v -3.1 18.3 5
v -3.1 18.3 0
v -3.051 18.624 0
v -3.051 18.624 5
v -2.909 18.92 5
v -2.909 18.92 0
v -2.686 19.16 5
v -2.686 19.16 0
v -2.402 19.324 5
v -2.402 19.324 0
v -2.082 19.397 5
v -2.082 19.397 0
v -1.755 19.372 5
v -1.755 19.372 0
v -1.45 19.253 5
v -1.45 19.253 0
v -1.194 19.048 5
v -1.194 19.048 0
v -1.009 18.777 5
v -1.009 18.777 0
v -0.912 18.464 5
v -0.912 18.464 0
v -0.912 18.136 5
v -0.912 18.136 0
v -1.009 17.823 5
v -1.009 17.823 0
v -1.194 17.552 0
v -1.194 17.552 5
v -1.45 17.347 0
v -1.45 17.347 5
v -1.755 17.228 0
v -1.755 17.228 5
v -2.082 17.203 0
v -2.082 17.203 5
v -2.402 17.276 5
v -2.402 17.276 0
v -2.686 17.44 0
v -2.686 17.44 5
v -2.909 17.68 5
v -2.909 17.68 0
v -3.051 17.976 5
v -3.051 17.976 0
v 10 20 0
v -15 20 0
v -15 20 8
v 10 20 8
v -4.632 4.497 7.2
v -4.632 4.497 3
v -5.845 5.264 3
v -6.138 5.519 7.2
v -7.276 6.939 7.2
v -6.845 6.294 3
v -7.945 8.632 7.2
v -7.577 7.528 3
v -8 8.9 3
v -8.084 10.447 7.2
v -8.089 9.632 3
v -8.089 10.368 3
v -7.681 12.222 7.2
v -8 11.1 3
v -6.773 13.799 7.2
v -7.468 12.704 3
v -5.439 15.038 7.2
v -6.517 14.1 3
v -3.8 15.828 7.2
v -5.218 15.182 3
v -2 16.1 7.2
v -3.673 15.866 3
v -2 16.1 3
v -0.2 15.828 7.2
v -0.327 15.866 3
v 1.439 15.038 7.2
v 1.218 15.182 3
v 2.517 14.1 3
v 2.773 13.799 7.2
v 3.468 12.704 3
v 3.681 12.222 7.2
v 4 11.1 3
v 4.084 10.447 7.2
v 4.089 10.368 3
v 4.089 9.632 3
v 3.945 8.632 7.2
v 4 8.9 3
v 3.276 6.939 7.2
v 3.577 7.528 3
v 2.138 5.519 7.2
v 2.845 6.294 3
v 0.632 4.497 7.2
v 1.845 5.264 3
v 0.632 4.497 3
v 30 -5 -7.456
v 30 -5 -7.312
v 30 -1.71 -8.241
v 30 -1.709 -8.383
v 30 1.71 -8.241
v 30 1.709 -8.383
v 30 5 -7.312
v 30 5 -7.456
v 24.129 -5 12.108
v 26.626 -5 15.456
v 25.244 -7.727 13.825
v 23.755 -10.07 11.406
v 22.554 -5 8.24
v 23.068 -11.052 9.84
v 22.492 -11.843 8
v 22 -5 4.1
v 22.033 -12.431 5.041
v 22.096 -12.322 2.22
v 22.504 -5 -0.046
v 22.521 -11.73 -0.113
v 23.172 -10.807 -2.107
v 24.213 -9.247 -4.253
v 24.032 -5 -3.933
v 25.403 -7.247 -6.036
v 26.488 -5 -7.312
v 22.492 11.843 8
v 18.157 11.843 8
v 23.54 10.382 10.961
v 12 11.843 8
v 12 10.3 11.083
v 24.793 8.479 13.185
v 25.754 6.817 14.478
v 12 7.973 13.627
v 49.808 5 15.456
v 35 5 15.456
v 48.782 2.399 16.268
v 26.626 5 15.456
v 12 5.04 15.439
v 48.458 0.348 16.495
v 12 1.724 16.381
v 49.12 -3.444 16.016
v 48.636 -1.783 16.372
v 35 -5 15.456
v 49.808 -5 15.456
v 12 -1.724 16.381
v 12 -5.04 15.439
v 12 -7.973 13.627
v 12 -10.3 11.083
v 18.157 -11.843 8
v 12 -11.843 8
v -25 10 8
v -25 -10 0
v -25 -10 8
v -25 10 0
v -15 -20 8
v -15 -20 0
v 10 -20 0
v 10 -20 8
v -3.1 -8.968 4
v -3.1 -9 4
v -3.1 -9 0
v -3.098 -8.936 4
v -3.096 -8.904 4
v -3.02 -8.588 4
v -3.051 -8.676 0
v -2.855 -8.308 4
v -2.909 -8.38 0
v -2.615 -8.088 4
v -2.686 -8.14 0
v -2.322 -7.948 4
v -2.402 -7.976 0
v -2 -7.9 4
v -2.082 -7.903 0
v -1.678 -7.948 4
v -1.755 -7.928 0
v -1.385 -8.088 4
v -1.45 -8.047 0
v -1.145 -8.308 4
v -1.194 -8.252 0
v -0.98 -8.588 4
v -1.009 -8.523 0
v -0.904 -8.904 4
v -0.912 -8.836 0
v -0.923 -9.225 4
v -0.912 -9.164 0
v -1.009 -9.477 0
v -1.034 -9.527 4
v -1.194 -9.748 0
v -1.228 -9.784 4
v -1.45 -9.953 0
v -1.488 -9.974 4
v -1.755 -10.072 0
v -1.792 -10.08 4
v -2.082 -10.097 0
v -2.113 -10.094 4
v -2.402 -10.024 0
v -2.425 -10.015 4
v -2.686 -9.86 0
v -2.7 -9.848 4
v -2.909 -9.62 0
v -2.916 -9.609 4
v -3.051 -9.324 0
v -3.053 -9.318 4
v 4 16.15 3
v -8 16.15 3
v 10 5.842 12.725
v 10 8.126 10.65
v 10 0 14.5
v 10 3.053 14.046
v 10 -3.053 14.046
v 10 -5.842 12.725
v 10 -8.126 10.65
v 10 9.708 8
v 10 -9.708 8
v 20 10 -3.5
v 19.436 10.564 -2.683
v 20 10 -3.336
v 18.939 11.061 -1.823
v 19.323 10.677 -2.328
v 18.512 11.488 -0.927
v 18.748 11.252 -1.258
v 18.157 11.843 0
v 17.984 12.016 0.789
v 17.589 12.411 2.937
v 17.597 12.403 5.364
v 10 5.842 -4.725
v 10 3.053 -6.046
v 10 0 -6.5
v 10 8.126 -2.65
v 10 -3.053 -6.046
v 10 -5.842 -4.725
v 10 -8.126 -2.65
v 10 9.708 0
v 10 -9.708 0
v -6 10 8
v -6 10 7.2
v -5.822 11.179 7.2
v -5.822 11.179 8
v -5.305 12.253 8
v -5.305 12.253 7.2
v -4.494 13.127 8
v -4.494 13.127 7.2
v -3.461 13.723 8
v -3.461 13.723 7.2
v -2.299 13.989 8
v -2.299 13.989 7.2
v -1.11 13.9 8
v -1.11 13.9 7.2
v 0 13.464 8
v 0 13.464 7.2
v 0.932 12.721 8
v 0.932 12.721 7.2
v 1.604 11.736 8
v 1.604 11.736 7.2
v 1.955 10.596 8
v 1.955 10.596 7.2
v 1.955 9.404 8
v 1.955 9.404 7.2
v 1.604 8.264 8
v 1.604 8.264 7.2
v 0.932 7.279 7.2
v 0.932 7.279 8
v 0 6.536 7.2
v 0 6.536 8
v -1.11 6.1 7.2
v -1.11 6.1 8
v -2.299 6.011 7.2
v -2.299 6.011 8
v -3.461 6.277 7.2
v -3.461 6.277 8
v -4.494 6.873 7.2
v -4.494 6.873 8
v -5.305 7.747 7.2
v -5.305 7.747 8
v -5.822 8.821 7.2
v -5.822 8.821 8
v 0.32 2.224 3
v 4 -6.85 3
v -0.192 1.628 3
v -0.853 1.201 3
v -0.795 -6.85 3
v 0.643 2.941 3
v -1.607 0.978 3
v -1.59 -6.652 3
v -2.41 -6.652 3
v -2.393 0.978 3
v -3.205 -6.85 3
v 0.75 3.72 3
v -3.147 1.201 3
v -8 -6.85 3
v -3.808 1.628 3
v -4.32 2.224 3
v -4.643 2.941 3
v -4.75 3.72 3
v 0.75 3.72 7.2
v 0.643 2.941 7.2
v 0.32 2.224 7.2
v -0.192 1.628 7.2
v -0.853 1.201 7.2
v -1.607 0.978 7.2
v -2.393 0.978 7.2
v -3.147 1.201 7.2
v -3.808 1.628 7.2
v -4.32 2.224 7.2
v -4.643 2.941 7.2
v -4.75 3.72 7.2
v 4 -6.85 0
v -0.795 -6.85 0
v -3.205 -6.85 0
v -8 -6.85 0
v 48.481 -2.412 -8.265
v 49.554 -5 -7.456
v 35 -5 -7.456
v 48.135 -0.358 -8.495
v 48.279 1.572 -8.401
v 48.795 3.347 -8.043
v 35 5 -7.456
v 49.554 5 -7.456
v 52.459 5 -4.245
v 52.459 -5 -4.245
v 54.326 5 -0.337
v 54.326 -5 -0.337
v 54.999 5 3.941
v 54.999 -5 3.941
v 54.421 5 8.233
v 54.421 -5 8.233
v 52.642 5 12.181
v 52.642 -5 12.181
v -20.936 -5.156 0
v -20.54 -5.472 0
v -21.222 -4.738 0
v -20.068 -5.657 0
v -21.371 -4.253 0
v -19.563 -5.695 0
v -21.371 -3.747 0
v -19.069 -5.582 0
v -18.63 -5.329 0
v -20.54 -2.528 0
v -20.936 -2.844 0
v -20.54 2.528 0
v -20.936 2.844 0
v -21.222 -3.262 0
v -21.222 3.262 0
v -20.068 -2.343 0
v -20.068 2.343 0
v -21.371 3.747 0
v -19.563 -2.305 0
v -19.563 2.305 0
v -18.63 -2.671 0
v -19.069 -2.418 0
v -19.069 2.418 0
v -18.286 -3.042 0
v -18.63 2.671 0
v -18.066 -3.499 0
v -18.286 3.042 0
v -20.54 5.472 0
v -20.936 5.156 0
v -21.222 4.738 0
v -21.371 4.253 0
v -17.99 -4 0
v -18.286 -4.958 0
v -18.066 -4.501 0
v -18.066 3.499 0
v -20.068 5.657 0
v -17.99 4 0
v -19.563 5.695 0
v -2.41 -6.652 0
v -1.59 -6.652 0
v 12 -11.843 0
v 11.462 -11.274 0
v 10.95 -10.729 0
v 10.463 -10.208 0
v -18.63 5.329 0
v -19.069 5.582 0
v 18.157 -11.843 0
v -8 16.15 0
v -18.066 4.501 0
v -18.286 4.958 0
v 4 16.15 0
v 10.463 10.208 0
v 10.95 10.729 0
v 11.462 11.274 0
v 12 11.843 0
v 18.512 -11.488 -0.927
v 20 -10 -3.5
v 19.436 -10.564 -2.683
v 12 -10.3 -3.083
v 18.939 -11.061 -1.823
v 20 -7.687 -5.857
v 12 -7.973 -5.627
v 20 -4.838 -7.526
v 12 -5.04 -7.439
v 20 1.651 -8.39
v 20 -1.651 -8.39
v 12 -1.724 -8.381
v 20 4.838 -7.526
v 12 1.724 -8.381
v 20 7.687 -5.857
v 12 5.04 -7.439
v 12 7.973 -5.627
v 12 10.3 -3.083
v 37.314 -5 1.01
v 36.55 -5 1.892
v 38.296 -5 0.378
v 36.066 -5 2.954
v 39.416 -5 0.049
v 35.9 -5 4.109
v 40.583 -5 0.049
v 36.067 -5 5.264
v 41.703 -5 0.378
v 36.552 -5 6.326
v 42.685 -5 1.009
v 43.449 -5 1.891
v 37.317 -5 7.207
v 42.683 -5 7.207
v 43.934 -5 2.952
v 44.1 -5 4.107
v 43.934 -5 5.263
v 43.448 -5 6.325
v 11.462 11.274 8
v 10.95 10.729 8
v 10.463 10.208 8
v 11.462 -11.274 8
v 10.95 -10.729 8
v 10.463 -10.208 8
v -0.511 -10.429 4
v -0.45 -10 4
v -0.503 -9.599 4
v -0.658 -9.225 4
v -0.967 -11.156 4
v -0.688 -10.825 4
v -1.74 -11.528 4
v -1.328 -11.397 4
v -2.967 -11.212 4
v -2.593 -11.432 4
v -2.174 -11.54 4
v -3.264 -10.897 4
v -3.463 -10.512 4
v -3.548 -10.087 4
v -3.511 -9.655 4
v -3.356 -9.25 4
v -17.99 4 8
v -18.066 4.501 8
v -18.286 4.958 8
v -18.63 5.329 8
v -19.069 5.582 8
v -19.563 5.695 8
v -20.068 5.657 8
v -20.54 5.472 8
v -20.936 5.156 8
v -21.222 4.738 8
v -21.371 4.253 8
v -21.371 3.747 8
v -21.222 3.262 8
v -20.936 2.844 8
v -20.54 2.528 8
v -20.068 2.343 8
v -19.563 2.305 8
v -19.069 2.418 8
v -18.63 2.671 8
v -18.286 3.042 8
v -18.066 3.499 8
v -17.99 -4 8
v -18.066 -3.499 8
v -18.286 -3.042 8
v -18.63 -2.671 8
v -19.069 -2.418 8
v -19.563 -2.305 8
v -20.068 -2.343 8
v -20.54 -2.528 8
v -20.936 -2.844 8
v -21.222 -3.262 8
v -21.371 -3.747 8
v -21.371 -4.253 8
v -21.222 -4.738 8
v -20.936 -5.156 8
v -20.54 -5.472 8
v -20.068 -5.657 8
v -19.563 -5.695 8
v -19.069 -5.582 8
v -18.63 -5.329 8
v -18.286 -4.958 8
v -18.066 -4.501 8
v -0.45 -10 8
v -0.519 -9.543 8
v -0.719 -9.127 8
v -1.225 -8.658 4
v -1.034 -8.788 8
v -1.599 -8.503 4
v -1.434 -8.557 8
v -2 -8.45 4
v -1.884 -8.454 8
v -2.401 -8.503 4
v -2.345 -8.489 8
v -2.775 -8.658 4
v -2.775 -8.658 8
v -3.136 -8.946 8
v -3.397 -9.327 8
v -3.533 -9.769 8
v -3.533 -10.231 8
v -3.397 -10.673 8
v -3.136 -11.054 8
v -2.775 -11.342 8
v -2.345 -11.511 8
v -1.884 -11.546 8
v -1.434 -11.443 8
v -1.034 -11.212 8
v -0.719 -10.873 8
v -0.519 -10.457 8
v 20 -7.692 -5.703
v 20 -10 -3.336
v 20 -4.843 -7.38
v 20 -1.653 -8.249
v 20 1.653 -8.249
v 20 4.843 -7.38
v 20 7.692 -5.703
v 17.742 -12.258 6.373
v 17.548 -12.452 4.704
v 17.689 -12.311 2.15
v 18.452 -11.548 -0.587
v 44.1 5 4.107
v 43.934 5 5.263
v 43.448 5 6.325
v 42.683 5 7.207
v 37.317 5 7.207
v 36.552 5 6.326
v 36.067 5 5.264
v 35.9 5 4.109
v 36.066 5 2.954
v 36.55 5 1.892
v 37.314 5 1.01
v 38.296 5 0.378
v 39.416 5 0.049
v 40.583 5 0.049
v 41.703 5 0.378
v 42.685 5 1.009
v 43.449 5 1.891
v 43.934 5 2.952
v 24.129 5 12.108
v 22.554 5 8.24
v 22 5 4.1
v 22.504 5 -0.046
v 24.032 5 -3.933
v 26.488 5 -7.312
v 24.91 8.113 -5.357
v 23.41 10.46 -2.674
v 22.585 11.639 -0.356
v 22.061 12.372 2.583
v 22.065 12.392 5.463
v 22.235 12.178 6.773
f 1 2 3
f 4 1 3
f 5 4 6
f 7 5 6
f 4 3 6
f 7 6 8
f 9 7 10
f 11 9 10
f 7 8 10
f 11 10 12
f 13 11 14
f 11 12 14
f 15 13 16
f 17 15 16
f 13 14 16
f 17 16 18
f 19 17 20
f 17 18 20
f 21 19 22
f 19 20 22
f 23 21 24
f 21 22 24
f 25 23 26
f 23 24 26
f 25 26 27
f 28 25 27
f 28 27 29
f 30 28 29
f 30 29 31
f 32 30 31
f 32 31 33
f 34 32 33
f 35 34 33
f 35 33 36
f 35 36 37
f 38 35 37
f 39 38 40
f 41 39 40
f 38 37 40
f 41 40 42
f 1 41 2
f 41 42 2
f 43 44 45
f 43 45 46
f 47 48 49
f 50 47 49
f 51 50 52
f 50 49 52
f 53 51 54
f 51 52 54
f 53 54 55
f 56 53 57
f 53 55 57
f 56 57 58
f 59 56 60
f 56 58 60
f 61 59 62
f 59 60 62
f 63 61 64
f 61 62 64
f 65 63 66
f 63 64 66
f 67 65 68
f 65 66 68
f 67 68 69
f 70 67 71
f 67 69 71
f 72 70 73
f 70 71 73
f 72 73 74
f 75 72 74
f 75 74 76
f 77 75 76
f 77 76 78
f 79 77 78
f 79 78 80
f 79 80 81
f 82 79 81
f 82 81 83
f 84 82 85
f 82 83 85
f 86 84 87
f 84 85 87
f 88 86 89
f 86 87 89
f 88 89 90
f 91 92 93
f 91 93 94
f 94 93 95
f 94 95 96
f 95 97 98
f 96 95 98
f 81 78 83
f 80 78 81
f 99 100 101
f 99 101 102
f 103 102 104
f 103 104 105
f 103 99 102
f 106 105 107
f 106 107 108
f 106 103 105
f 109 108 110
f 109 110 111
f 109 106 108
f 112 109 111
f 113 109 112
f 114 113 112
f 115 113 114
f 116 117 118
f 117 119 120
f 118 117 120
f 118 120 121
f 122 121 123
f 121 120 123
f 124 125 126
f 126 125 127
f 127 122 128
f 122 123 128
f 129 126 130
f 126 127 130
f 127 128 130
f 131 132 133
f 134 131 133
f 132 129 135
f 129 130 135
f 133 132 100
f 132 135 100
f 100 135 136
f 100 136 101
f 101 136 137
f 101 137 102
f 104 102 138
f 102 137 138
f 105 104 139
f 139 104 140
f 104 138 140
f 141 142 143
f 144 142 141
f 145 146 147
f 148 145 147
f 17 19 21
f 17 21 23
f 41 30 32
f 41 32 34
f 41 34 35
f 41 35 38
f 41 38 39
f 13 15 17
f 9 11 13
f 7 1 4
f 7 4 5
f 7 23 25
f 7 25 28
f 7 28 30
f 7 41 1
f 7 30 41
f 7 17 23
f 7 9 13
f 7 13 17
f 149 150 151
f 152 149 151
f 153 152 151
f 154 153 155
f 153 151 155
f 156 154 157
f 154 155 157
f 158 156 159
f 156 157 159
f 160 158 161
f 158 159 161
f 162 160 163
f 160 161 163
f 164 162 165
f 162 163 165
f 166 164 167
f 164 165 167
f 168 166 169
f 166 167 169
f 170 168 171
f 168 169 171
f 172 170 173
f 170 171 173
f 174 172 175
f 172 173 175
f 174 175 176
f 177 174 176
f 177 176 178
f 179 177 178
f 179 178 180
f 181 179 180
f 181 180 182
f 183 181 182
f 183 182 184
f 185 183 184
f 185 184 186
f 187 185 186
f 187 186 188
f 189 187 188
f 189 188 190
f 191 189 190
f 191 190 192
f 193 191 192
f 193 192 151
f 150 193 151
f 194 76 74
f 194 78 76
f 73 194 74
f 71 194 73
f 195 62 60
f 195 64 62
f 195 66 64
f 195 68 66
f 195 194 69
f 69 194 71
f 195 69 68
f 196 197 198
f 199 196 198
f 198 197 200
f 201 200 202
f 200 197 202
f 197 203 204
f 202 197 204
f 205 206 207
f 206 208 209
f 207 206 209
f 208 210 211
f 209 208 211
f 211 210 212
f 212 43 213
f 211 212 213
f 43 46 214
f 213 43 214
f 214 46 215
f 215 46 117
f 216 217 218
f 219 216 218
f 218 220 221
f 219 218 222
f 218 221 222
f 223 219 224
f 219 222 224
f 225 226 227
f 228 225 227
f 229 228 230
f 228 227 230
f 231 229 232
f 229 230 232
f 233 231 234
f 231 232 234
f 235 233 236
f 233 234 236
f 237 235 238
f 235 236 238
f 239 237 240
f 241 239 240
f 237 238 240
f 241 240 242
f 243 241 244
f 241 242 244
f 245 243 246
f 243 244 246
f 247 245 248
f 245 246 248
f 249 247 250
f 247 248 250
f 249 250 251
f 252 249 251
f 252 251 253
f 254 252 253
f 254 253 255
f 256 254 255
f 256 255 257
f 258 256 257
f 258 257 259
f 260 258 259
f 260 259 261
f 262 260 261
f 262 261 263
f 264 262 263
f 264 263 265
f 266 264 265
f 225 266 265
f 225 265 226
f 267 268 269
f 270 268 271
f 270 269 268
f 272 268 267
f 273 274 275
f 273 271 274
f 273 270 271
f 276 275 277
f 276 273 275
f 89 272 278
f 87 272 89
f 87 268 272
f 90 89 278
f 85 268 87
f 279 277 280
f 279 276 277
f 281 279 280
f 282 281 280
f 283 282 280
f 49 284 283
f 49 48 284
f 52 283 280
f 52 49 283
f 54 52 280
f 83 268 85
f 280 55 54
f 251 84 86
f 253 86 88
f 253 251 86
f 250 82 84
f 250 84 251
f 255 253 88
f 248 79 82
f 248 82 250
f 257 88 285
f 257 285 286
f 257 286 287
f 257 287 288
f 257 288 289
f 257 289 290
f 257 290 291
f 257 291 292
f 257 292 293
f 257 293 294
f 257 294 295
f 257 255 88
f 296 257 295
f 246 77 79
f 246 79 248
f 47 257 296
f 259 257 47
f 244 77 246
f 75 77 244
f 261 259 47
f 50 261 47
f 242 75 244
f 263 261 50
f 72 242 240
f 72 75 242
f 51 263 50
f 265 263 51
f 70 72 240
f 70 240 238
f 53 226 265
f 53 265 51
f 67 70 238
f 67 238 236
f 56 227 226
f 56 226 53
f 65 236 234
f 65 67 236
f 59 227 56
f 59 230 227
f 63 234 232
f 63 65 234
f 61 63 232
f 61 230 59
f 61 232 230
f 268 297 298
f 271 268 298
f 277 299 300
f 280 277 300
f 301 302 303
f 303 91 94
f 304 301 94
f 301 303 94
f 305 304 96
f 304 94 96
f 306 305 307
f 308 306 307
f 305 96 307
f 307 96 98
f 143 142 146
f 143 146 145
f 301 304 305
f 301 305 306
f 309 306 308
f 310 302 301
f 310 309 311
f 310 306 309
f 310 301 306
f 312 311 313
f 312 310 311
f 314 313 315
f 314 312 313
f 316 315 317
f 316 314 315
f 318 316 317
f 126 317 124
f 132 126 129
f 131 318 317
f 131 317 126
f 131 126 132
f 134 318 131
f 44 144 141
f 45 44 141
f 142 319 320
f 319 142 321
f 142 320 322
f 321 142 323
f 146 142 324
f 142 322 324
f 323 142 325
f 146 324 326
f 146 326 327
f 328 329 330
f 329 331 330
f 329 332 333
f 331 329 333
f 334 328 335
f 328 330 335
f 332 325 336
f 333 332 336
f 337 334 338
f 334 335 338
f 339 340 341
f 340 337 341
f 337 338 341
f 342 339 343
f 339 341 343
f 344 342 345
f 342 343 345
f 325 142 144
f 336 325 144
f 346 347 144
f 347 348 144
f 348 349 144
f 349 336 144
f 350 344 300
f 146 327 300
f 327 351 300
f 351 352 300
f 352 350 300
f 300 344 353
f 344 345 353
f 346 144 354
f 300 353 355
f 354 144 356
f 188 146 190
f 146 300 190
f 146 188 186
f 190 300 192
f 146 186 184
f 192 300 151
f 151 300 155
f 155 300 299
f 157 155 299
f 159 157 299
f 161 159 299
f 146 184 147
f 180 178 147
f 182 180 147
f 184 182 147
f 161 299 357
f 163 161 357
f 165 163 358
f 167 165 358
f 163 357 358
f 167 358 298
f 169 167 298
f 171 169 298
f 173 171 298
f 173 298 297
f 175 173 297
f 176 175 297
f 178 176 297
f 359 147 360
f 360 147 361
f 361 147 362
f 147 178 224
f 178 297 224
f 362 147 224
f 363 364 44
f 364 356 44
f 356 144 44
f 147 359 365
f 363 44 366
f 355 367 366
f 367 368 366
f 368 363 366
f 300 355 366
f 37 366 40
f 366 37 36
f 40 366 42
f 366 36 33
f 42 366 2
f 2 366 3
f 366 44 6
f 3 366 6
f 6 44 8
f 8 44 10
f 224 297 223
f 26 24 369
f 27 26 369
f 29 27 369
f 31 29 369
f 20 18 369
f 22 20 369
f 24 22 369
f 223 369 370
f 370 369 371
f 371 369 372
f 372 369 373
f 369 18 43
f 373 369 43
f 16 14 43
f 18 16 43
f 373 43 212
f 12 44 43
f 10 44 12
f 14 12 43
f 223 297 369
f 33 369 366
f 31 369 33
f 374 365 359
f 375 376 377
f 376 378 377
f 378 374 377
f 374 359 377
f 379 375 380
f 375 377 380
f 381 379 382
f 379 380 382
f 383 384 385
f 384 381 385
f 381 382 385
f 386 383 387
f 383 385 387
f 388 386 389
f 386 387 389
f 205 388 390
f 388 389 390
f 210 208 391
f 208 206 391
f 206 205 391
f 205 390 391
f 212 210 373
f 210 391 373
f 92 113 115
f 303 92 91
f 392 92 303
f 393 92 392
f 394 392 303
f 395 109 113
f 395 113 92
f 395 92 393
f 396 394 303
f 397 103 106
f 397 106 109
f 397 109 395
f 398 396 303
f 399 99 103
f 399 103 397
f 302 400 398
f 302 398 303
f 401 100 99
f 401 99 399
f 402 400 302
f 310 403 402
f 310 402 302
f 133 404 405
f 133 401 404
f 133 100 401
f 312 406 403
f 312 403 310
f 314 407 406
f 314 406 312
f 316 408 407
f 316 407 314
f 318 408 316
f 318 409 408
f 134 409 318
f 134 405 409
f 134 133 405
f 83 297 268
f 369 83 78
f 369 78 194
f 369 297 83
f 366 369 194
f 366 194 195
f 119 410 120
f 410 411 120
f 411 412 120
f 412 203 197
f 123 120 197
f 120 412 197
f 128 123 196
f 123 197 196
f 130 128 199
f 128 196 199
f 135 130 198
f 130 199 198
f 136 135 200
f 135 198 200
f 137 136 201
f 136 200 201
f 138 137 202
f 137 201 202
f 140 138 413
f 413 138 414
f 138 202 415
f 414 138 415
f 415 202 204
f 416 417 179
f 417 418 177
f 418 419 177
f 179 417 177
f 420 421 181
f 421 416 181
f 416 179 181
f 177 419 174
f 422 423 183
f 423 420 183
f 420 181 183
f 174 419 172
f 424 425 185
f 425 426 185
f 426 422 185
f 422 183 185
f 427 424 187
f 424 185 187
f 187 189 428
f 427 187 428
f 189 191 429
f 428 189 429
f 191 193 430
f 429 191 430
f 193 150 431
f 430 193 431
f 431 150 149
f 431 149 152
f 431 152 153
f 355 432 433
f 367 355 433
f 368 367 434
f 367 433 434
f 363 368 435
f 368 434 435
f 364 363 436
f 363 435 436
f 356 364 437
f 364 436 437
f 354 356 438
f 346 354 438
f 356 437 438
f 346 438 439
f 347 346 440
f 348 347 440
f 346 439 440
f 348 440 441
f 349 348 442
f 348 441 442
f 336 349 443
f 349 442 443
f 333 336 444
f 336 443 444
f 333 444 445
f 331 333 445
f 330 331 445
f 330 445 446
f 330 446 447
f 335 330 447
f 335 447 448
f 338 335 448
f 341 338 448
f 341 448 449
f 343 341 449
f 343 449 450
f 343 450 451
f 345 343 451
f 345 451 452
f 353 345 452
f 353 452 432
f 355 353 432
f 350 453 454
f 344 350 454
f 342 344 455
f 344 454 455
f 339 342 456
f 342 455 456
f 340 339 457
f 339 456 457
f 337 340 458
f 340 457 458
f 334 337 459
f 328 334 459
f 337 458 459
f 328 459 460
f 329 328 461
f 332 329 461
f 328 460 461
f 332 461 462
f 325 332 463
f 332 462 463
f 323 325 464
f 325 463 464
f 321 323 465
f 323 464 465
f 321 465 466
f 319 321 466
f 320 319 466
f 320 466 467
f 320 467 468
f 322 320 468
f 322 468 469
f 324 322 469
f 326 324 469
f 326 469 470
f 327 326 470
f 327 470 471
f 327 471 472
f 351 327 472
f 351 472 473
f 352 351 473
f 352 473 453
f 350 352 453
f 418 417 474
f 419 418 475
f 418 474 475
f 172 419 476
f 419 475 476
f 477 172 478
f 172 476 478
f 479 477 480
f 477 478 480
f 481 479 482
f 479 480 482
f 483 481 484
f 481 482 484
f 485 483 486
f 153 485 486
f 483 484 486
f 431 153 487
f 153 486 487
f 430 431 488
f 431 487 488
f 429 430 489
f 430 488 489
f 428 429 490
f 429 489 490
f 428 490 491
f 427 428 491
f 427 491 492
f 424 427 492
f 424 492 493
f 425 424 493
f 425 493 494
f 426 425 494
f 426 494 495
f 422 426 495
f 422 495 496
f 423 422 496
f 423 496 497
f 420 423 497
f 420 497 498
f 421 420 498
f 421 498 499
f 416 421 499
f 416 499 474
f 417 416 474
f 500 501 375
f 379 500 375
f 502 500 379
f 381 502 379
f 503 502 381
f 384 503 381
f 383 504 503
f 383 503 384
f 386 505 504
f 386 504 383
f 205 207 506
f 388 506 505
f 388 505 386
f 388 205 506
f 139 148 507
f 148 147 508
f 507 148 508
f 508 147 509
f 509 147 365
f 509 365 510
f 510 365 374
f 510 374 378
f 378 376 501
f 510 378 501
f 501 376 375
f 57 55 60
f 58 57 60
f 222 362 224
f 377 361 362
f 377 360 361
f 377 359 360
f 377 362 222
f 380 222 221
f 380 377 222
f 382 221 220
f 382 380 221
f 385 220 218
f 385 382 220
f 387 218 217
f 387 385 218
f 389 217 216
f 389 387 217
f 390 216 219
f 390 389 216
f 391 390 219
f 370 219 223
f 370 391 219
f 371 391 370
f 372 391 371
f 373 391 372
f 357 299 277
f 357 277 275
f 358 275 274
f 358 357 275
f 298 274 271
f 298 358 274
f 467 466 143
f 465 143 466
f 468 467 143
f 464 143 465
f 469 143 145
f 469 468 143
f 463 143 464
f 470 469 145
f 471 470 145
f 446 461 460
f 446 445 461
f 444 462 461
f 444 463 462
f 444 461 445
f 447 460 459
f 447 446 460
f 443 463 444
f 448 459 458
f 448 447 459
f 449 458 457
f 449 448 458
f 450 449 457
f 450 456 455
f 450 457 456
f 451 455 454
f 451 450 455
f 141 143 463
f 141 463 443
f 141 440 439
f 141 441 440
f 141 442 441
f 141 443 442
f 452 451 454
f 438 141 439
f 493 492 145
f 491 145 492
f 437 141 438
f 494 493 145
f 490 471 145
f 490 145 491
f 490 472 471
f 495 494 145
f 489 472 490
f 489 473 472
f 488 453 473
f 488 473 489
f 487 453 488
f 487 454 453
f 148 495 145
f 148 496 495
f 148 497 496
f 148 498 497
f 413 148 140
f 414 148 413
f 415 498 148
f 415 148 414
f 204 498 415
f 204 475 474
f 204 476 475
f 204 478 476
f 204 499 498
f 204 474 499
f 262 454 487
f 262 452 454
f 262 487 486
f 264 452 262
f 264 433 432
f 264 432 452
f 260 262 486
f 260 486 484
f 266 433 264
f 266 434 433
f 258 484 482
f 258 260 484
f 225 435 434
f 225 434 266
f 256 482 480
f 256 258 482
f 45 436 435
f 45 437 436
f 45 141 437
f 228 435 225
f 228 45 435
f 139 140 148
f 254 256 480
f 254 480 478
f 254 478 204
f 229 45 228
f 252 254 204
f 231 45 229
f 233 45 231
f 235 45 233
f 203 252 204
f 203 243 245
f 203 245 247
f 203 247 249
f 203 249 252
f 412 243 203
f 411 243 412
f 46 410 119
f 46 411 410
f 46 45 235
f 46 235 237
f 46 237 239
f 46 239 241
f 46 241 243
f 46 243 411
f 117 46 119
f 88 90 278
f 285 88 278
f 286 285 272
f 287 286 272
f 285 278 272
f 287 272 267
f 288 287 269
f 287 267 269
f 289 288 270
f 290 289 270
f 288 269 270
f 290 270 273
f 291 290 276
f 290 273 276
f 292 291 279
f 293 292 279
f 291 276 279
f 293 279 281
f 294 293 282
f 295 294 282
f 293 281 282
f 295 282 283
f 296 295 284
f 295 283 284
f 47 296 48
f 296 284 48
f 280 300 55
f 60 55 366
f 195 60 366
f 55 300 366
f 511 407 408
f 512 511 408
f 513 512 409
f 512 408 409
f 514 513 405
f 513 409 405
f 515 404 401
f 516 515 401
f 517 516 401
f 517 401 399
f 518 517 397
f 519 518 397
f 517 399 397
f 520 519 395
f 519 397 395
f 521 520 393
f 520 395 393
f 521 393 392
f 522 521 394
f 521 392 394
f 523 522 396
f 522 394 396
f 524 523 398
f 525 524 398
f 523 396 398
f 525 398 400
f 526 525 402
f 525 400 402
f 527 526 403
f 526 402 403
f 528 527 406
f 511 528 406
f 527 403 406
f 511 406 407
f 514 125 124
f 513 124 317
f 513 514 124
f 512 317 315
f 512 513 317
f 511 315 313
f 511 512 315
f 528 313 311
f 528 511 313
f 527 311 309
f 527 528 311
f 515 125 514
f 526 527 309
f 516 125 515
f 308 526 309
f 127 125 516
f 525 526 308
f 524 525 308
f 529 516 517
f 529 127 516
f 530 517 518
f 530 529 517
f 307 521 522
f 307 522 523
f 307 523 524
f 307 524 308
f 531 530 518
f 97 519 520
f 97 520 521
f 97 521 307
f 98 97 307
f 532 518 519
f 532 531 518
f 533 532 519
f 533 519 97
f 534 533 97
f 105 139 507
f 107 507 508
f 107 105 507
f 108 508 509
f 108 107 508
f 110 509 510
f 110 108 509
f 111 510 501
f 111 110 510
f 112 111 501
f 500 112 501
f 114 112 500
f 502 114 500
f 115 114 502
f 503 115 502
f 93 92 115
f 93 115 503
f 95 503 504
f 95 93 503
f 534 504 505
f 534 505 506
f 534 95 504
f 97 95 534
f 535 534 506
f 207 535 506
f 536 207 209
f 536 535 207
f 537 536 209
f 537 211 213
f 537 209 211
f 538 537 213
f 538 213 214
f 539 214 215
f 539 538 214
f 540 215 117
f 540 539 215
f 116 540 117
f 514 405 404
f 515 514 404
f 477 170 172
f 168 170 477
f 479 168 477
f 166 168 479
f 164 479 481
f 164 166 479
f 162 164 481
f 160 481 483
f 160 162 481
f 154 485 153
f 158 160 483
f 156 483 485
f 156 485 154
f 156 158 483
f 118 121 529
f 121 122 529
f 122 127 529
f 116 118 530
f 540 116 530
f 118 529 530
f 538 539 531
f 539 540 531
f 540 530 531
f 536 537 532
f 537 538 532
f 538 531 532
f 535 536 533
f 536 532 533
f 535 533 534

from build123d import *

# Parameters (mm, degrees)
SKETCH_1_W           = 50
SKETCH_1_H           = 40
EXTRUDE_1_DEPTH      = 8
CHAMFER_1_SIZE       = 10
SKETCH_2_R           = 1.55
CUT_EXTRUDE_1_DEPTH  = 10
EXTRUDE_2_DEPTH      = 30
EXTRUDE_2_DEPTH_BACK = 15
SKETCH_3_R           = 12.5
SKETCH_4_R           = 1.7
CUT_EXTRUDE_2_DEPTH  = 15
CUT_EXTRUDE_START    = -20
CUT_EXTRUDE_3_DEPTH  = 20
SKETCH_7_R           = 16.5
CUT_EXTRUDE_8_DEPTH  = 33
CUT_EXTRUDE_9_DEPTH  = 20
CHAMFER_3_SIZE       = 2
CUT_EXTRUDE_START_2  = 20
SKETCH_10_OUTSIDE_W  = 45.574
SKETCH_10_OUTSIDE_H  = 60.574
SKETCH_10_OUTSIDE_R  = 12.466047995
CUT_EXTRUDE_10_DEPTH = 10
CHAMFER_4_SIZE       = 10
SKETCH_14_W          = 12
SKETCH_14_H          = 23
CUT_EXTRUDE_11_DEPTH = 3
CUT_EXTRUDE_12_DEPTH = 4.2
SKETCH_16_R          = 1.1
CUT_EXTRUDE_13_DEPTH = 5
SKETCH_17_R          = 3.372674955
EXTRUDE_3_DEPTH      = 4
SKETCH_18_R          = 1.1
CUT_EXTRUDE_14_DEPTH = 4
SKETCH_20_R          = 4
CUT_EXTRUDE_15_DEPTH = 4
CUT_EXTRUDE_17_DEPTH = 10


# Read off the part's stored shape, not the designer's step: 切除-拉伸3
with BuildPart() as part:
    # 草图1 → 凸台-拉伸1 (new body)
    with BuildSketch(Plane.XY):
        Rectangle(SKETCH_1_W, SKETCH_1_H)
    extrude(amount=EXTRUDE_1_DEPTH)

    # 倒角1
    chamfer_1_edges = [part.edges().sort_by_distance(p)[0] for p in [
        (-25, -20, 4),
        (-25, 20, 4),
    ]]
    chamfer(chamfer_1_edges, length=CHAMFER_1_SIZE)

    # 草图2 → 切除-拉伸1 (cut)
    with BuildSketch(Plane.XY.offset(8)):
        with Locations((-2, -10)):
            Circle(SKETCH_2_R)
        with Locations((-2, 10)):
            Circle(SKETCH_2_R)
    extrude(amount=-CUT_EXTRUDE_1_DEPTH, mode=Mode.SUBTRACT)

    # 草图3 → 凸台-拉伸2 (add, two sides: drawn at the far end of the back side and taken through both)
    with BuildSketch(Plane(origin=(25, 0, 0), x_dir=(0, 0, -1), z_dir=(1, 0, 0)).offset(-EXTRUDE_2_DEPTH_BACK)):
        with Locations(Location((-4, 0, 0), (0, 0, 251.337075115))):
            Circle(SKETCH_3_R)
    extrude(amount=EXTRUDE_2_DEPTH + EXTRUDE_2_DEPTH_BACK)

    # 草图4 → 切除-拉伸2 (cut)
    with BuildSketch(Plane.XY.offset(8)):
        with Locations((-19.690178066, -4)):
            Circle(SKETCH_4_R)
        with Locations((-19.690178066, 4)):
            Circle(SKETCH_4_R)
    extrude(amount=-CUT_EXTRUDE_2_DEPTH, mode=Mode.SUBTRACT)

    # 切除-拉伸3 outline → 切除-拉伸3 (cut)
    with BuildSketch(Plane(origin=(55, 0, 0), x_dir=(0, 0, -1), z_dir=(1, 0, 0)).offset(CUT_EXTRUDE_START)):
        with BuildLine():
            Line((7.456439237, -5), (-15.456439237, -5))
            ThreePointArc((-15.456439237, -5), (-4, -12.5), (7.456439237, -5))
        make_face()
        with BuildLine():
            ThreePointArc((7.456439237, 5), (-4, 12.5), (-15.456439237, 5))
            Line((-15.456439237, 5), (7.456439237, 5))
        make_face()
    extrude(amount=CUT_EXTRUDE_3_DEPTH, mode=Mode.SUBTRACT)

    # 草图7 → 切除-拉伸8 (cut)
    with BuildSketch(Plane.XZ.offset(5)):
        with Locations((38.5, 4)):
            Circle(SKETCH_7_R)
    cut_extrude_8 = extrude(amount=CUT_EXTRUDE_8_DEPTH, mode=Mode.SUBTRACT)

    # 镜向1: 切除-拉伸8 across plane
    add(cut_extrude_8.mirror(Plane.ZX), mode=Mode.SUBTRACT)

    # 草图8 → 切除-拉伸9 (cut)
    with BuildSketch(Plane.XZ.offset(5)):
        with BuildLine():
            Line((40, 19.107397707), (75.764252489, 33.62580965))
            Line((75.764252489, 33.62580965), (78.826270749, -18.347337912))
            Line((78.826270749, -18.347337912), (40, -10.892602293))
            ThreePointArc((40, -10.892602293), (55, 4.107397707), (40, 19.107397707))
        make_face()
    extrude(amount=-CUT_EXTRUDE_9_DEPTH, mode=Mode.SUBTRACT)

    # 倒角3
    chamfer_3_edges = [part.edges().sort_by_distance(p)[0] for p in [
        (10, 0, 16.5),
        (10, 0, -8.5),
    ]]
    chamfer(chamfer_3_edges, length=CHAMFER_3_SIZE)

    # 草图10 outside → 切除-拉伸10 (cut)
    with BuildSketch(Plane(origin=(10, 0, 0), x_dir=(0, 0, -1), z_dir=(1, 0, 0)).offset(CUT_EXTRUDE_START_2)):
        with Locations((-4, 0)):
            Rectangle(SKETCH_10_OUTSIDE_W, SKETCH_10_OUTSIDE_H)
        with Locations((-4.107397707, 0)):
            Circle(SKETCH_10_OUTSIDE_R, mode=Mode.SUBTRACT)
    extrude(amount=-CUT_EXTRUDE_10_DEPTH, mode=Mode.SUBTRACT)

    # 倒角4
    # the kernel refuses this chamfer: 10 mm, written as the material it takes off along each edge
    with BuildSketch(Plane(origin=(20, -20, -25.71682988), x_dir=(-0.9996219169112968, -0.027495876610586317, 0), z_dir=(0, 0, 1))) as chamfer_4_piece_1_section:
        Polygon((CHAMFER_4_SIZE * 0.999621916911, -CHAMFER_4_SIZE * 0.0274958766106), (-CHAMFER_4_SIZE * 0.0274958766106, -CHAMFER_4_SIZE * 0.999621916911), (0, 0), align=None)
    chamfer_4_piece_1 = extrude(amount=59.433659759, mode=Mode.PRIVATE)
    chamfer_4_piece_1 = chamfer_4_piece_1 - Plane(origin=(16.670068992, 0, 4.107397707), x_dir=(0, 0, -1), z_dir=(1, 0, 0)) * Cylinder(12.466047995, 159, mode=Mode.PRIVATE)
    add(chamfer_4_piece_1, mode=Mode.SUBTRACT)
    with BuildSketch(Plane(origin=(20, 20, 33.71682988), x_dir=(-0.9996219169112968, 0.027495876610586317, 0), z_dir=(0, 0, -1))) as chamfer_4_piece_2_section:
        Polygon((CHAMFER_4_SIZE * 0.999621916911, -CHAMFER_4_SIZE * 0.0274958766106), (-CHAMFER_4_SIZE * 0.0274958766106, -CHAMFER_4_SIZE * 0.999621916911), (0, 0), align=None)
    chamfer_4_piece_2 = extrude(amount=59.433659759, mode=Mode.PRIVATE)
    chamfer_4_piece_2 = chamfer_4_piece_2 - Plane(origin=(16.670068992, 0, 4.107397707), x_dir=(0, 0, -1), z_dir=(1, 0, 0)) * Cylinder(12.466047995, 159, mode=Mode.PRIVATE)
    add(chamfer_4_piece_2, mode=Mode.SUBTRACT)

    # 草图14 → 切除-拉伸11 (cut)
    with BuildSketch(Plane(origin=(0, 0, 0), x_dir=(-1, 0, 0), z_dir=(0, 0, -1))):
        with Locations((2, 4.65)):
            Rectangle(SKETCH_14_W, SKETCH_14_H)
    extrude(amount=-CUT_EXTRUDE_11_DEPTH, mode=Mode.SUBTRACT)

    # 草图15 → 切除-拉伸12 (cut)
    with BuildSketch(Plane(origin=(0, 0, 3), x_dir=(-1, 0, 0), z_dir=(0, 0, -1))):
        with BuildLine():
            ThreePointArc((4.631967524, 4.49702381), (2, 16.1), (-0.631967524, 4.49702381))
            ThreePointArc((-0.631967524, 4.49702381), (2, 0.95), (4.631967524, 4.49702381))
        make_face()
    extrude(amount=-CUT_EXTRUDE_12_DEPTH, mode=Mode.SUBTRACT)

    # 草图16 → 切除-拉伸13 (cut)
    with BuildSketch(Plane(origin=(0, 0, 0), x_dir=(-1, 0, 0), z_dir=(0, 0, -1))):
        with Locations((2, 18.3)):
            Circle(SKETCH_16_R)
    extrude(amount=-CUT_EXTRUDE_13_DEPTH, mode=Mode.SUBTRACT)

    # 草图17 → 凸台-拉伸3 (add)
    with BuildSketch(Plane(origin=(0, 0, 0), x_dir=(-1, 0, 0), z_dir=(0, 0, -1))):
        with Locations((2, -10)):
            Circle(SKETCH_17_R)
    extrude(amount=-EXTRUDE_3_DEPTH)

    # 草图18 → 切除-拉伸14 (cut)
    with BuildSketch(Plane(origin=(0, 0, 0), x_dir=(-1, 0, 0), z_dir=(0, 0, -1))):
        with Locations((2, -9)):
            Circle(SKETCH_18_R)
    extrude(amount=-CUT_EXTRUDE_14_DEPTH, mode=Mode.SUBTRACT)

    # 草图20 → 切除-拉伸15 (cut)
    with BuildSketch(Plane(origin=(0, 0, 7.2), x_dir=(-1, 0, 0), z_dir=(0, 0, -1))):
        with Locations((2, 10)):
            Circle(SKETCH_20_R)
    extrude(amount=-CUT_EXTRUDE_15_DEPTH, mode=Mode.SUBTRACT)

    # 草图21 → 切除-拉伸17 (cut)
    with BuildSketch(Plane.XZ.offset(5)):
        with BuildLine():
            Line((42.683281573, 7.207397707), (37.316718427, 7.207397707))
            ThreePointArc((37.316718427, 7.207397707), (38.295807295, 0.378359329), (44.1, 4.107397707))
            ThreePointArc((44.1, 4.107397707), (43.729038378, 5.811590412), (42.683281573, 7.207397707))
        make_face()
    extrude(amount=-CUT_EXTRUDE_17_DEPTH, mode=Mode.SUBTRACT)


solid = part.part
